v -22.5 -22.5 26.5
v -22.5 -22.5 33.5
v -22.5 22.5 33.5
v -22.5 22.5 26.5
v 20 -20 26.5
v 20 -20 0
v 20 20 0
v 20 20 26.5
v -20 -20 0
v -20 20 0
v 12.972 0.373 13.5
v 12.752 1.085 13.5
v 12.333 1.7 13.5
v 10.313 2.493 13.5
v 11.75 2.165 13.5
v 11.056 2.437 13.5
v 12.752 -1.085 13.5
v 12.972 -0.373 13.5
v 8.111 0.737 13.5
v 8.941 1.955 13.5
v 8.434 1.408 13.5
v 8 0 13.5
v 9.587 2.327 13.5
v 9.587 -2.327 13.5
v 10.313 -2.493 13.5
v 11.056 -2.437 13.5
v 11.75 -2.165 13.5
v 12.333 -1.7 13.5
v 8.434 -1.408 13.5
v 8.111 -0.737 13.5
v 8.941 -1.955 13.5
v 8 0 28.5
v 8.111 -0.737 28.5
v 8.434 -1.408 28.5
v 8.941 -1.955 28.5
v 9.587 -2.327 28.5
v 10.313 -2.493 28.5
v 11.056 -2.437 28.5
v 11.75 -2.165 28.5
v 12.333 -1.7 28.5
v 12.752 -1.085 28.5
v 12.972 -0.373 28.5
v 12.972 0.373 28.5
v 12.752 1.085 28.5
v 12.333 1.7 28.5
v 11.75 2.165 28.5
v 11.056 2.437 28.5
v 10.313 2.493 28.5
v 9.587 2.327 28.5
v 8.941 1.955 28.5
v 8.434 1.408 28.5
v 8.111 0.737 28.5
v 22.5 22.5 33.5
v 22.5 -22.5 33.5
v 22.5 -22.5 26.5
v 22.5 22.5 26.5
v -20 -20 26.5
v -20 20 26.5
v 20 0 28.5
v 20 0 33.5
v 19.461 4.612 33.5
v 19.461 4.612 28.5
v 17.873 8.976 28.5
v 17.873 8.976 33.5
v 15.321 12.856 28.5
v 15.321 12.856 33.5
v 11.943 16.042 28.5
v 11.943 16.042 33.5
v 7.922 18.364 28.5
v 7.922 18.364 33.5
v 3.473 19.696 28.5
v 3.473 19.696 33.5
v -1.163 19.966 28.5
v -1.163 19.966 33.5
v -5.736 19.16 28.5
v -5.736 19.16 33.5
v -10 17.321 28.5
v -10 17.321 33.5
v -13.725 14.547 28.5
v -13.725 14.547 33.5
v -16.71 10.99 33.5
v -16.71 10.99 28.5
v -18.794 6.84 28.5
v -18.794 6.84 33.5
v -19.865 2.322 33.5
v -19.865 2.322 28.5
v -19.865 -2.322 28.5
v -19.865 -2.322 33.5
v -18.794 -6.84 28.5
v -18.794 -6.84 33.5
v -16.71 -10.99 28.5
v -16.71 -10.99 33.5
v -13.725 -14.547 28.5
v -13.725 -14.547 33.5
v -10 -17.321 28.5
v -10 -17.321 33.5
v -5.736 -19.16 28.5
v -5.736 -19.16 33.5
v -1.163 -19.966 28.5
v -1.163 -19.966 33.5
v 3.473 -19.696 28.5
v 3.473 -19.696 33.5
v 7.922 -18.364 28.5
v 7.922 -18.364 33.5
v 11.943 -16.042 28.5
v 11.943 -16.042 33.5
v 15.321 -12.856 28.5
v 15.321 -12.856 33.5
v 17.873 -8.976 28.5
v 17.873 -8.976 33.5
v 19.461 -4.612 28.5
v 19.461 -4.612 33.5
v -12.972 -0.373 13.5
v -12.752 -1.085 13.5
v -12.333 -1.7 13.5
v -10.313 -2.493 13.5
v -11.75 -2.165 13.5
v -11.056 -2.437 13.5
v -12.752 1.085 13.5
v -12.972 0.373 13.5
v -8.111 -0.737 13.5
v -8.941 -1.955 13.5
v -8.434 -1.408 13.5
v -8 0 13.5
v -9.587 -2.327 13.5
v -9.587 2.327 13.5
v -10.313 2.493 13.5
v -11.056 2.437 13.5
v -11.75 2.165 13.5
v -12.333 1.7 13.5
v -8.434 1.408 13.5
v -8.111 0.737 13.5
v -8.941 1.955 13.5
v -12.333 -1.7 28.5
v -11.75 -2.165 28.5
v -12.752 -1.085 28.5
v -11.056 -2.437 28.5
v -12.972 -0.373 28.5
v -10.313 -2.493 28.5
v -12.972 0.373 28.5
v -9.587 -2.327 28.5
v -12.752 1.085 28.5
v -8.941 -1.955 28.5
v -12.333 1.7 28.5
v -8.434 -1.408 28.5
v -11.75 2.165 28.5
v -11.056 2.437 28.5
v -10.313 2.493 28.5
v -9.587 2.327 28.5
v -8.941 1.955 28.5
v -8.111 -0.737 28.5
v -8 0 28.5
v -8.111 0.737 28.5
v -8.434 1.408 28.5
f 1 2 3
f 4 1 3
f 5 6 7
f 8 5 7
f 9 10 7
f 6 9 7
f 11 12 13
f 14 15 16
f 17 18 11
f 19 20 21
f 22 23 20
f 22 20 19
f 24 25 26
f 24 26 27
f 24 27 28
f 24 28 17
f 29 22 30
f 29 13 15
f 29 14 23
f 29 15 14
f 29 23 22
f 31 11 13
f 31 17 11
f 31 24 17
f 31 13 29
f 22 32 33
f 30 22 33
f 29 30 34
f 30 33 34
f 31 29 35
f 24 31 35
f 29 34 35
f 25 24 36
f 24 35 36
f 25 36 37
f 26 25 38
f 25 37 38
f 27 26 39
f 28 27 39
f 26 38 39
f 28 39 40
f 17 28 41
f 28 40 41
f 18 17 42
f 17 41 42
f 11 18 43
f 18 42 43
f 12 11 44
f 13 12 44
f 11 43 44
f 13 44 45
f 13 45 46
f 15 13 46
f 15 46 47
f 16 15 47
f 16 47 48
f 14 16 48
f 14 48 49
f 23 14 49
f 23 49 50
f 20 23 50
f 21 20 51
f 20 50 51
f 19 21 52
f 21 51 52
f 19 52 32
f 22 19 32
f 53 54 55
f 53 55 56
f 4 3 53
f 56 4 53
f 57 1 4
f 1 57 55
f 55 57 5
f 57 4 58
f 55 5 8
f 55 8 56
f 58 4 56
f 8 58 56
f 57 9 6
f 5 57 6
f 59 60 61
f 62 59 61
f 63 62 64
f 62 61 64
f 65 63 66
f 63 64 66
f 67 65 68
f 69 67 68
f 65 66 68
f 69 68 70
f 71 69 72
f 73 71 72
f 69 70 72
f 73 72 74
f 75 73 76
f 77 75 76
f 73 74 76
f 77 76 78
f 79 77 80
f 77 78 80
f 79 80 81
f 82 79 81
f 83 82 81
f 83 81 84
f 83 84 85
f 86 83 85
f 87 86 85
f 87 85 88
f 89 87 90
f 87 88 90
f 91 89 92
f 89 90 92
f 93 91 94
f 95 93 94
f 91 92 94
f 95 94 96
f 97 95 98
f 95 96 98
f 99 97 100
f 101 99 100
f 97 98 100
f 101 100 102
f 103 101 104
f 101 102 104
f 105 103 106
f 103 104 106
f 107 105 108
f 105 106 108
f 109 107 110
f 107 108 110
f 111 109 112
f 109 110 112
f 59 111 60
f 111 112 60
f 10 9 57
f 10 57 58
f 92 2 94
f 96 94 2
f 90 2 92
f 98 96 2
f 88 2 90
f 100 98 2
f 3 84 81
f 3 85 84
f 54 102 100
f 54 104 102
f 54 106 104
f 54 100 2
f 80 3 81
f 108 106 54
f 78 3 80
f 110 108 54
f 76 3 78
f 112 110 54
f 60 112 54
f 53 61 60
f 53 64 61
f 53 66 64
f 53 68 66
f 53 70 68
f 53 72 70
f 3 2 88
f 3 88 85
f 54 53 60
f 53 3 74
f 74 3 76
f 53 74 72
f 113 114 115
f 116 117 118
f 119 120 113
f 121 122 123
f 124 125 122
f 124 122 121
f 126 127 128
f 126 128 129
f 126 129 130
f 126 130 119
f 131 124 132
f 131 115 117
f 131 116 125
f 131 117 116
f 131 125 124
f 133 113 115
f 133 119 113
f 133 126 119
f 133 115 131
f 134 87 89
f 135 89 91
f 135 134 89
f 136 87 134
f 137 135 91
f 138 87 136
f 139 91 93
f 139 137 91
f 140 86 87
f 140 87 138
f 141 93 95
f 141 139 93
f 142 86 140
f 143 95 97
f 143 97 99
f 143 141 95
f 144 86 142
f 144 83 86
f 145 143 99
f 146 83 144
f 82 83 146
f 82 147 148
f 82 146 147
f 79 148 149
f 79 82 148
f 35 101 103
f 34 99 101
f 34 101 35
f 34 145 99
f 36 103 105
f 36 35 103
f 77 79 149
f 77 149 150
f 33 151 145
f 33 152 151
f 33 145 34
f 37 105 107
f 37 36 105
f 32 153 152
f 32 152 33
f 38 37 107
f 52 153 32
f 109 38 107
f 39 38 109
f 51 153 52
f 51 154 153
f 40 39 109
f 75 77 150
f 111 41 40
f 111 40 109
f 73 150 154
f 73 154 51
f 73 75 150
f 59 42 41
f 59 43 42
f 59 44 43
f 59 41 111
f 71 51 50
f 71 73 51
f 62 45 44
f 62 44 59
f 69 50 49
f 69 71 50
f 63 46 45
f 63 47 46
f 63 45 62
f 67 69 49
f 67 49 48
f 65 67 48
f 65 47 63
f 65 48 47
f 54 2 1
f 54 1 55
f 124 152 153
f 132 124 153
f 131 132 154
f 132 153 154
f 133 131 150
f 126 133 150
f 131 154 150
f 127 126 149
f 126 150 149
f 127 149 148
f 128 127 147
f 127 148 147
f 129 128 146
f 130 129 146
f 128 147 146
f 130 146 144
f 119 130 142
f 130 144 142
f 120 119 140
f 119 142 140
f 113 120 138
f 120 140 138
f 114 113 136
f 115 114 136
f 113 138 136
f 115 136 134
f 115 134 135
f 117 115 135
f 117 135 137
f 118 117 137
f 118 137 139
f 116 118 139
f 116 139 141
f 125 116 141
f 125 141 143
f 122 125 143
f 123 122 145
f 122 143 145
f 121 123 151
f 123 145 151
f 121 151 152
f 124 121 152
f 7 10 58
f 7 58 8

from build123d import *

# Parameters (mm, degrees)
SKETCH_1_W          = 40
SKETCH_1_H          = 40
EXTRUDE_1_DEPTH     = 33.5
SKETCH_2_W          = 45
SKETCH_2_H          = 45
EXTRUDE_2_DEPTH     = 7
SKETCH_3_R          = 20
CUT_EXTRUDE_3_DEPTH = 5
SKETCH_4_R          = 2.5
CUT_EXTRUDE_4_DEPTH = 15


with BuildPart() as part:
    # Эскиз1 → Бобышка-Вытянуть1 (new body)
    with BuildSketch(Plane.XY):
        Rectangle(SKETCH_1_W, SKETCH_1_H)
    extrude(amount=EXTRUDE_1_DEPTH)

    # Эскиз2 → Бобышка-Вытянуть2 (add)
    with BuildSketch(Plane.XY.offset(33.5)):
        Rectangle(SKETCH_2_W, SKETCH_2_H)
    extrude(amount=-EXTRUDE_2_DEPTH)

    # Эскиз3 → Вырез-Вытянуть3 (cut)
    with BuildSketch(Plane.XY.offset(33.5)):
        Circle(SKETCH_3_R)
    extrude(amount=-CUT_EXTRUDE_3_DEPTH, mode=Mode.SUBTRACT)

    # Эскиз4 → Вырез-Вытянуть4 (cut)
    with BuildSketch(Plane.XY.offset(28.5)):
        with Locations((-10.5, 0)):
            Circle(SKETCH_4_R)
        with Locations(Location((10.5, 0, 0), (0, 0, 180))):
            Circle(SKETCH_4_R)
    extrude(amount=-CUT_EXTRUDE_4_DEPTH, mode=Mode.SUBTRACT)


solid = part.part
